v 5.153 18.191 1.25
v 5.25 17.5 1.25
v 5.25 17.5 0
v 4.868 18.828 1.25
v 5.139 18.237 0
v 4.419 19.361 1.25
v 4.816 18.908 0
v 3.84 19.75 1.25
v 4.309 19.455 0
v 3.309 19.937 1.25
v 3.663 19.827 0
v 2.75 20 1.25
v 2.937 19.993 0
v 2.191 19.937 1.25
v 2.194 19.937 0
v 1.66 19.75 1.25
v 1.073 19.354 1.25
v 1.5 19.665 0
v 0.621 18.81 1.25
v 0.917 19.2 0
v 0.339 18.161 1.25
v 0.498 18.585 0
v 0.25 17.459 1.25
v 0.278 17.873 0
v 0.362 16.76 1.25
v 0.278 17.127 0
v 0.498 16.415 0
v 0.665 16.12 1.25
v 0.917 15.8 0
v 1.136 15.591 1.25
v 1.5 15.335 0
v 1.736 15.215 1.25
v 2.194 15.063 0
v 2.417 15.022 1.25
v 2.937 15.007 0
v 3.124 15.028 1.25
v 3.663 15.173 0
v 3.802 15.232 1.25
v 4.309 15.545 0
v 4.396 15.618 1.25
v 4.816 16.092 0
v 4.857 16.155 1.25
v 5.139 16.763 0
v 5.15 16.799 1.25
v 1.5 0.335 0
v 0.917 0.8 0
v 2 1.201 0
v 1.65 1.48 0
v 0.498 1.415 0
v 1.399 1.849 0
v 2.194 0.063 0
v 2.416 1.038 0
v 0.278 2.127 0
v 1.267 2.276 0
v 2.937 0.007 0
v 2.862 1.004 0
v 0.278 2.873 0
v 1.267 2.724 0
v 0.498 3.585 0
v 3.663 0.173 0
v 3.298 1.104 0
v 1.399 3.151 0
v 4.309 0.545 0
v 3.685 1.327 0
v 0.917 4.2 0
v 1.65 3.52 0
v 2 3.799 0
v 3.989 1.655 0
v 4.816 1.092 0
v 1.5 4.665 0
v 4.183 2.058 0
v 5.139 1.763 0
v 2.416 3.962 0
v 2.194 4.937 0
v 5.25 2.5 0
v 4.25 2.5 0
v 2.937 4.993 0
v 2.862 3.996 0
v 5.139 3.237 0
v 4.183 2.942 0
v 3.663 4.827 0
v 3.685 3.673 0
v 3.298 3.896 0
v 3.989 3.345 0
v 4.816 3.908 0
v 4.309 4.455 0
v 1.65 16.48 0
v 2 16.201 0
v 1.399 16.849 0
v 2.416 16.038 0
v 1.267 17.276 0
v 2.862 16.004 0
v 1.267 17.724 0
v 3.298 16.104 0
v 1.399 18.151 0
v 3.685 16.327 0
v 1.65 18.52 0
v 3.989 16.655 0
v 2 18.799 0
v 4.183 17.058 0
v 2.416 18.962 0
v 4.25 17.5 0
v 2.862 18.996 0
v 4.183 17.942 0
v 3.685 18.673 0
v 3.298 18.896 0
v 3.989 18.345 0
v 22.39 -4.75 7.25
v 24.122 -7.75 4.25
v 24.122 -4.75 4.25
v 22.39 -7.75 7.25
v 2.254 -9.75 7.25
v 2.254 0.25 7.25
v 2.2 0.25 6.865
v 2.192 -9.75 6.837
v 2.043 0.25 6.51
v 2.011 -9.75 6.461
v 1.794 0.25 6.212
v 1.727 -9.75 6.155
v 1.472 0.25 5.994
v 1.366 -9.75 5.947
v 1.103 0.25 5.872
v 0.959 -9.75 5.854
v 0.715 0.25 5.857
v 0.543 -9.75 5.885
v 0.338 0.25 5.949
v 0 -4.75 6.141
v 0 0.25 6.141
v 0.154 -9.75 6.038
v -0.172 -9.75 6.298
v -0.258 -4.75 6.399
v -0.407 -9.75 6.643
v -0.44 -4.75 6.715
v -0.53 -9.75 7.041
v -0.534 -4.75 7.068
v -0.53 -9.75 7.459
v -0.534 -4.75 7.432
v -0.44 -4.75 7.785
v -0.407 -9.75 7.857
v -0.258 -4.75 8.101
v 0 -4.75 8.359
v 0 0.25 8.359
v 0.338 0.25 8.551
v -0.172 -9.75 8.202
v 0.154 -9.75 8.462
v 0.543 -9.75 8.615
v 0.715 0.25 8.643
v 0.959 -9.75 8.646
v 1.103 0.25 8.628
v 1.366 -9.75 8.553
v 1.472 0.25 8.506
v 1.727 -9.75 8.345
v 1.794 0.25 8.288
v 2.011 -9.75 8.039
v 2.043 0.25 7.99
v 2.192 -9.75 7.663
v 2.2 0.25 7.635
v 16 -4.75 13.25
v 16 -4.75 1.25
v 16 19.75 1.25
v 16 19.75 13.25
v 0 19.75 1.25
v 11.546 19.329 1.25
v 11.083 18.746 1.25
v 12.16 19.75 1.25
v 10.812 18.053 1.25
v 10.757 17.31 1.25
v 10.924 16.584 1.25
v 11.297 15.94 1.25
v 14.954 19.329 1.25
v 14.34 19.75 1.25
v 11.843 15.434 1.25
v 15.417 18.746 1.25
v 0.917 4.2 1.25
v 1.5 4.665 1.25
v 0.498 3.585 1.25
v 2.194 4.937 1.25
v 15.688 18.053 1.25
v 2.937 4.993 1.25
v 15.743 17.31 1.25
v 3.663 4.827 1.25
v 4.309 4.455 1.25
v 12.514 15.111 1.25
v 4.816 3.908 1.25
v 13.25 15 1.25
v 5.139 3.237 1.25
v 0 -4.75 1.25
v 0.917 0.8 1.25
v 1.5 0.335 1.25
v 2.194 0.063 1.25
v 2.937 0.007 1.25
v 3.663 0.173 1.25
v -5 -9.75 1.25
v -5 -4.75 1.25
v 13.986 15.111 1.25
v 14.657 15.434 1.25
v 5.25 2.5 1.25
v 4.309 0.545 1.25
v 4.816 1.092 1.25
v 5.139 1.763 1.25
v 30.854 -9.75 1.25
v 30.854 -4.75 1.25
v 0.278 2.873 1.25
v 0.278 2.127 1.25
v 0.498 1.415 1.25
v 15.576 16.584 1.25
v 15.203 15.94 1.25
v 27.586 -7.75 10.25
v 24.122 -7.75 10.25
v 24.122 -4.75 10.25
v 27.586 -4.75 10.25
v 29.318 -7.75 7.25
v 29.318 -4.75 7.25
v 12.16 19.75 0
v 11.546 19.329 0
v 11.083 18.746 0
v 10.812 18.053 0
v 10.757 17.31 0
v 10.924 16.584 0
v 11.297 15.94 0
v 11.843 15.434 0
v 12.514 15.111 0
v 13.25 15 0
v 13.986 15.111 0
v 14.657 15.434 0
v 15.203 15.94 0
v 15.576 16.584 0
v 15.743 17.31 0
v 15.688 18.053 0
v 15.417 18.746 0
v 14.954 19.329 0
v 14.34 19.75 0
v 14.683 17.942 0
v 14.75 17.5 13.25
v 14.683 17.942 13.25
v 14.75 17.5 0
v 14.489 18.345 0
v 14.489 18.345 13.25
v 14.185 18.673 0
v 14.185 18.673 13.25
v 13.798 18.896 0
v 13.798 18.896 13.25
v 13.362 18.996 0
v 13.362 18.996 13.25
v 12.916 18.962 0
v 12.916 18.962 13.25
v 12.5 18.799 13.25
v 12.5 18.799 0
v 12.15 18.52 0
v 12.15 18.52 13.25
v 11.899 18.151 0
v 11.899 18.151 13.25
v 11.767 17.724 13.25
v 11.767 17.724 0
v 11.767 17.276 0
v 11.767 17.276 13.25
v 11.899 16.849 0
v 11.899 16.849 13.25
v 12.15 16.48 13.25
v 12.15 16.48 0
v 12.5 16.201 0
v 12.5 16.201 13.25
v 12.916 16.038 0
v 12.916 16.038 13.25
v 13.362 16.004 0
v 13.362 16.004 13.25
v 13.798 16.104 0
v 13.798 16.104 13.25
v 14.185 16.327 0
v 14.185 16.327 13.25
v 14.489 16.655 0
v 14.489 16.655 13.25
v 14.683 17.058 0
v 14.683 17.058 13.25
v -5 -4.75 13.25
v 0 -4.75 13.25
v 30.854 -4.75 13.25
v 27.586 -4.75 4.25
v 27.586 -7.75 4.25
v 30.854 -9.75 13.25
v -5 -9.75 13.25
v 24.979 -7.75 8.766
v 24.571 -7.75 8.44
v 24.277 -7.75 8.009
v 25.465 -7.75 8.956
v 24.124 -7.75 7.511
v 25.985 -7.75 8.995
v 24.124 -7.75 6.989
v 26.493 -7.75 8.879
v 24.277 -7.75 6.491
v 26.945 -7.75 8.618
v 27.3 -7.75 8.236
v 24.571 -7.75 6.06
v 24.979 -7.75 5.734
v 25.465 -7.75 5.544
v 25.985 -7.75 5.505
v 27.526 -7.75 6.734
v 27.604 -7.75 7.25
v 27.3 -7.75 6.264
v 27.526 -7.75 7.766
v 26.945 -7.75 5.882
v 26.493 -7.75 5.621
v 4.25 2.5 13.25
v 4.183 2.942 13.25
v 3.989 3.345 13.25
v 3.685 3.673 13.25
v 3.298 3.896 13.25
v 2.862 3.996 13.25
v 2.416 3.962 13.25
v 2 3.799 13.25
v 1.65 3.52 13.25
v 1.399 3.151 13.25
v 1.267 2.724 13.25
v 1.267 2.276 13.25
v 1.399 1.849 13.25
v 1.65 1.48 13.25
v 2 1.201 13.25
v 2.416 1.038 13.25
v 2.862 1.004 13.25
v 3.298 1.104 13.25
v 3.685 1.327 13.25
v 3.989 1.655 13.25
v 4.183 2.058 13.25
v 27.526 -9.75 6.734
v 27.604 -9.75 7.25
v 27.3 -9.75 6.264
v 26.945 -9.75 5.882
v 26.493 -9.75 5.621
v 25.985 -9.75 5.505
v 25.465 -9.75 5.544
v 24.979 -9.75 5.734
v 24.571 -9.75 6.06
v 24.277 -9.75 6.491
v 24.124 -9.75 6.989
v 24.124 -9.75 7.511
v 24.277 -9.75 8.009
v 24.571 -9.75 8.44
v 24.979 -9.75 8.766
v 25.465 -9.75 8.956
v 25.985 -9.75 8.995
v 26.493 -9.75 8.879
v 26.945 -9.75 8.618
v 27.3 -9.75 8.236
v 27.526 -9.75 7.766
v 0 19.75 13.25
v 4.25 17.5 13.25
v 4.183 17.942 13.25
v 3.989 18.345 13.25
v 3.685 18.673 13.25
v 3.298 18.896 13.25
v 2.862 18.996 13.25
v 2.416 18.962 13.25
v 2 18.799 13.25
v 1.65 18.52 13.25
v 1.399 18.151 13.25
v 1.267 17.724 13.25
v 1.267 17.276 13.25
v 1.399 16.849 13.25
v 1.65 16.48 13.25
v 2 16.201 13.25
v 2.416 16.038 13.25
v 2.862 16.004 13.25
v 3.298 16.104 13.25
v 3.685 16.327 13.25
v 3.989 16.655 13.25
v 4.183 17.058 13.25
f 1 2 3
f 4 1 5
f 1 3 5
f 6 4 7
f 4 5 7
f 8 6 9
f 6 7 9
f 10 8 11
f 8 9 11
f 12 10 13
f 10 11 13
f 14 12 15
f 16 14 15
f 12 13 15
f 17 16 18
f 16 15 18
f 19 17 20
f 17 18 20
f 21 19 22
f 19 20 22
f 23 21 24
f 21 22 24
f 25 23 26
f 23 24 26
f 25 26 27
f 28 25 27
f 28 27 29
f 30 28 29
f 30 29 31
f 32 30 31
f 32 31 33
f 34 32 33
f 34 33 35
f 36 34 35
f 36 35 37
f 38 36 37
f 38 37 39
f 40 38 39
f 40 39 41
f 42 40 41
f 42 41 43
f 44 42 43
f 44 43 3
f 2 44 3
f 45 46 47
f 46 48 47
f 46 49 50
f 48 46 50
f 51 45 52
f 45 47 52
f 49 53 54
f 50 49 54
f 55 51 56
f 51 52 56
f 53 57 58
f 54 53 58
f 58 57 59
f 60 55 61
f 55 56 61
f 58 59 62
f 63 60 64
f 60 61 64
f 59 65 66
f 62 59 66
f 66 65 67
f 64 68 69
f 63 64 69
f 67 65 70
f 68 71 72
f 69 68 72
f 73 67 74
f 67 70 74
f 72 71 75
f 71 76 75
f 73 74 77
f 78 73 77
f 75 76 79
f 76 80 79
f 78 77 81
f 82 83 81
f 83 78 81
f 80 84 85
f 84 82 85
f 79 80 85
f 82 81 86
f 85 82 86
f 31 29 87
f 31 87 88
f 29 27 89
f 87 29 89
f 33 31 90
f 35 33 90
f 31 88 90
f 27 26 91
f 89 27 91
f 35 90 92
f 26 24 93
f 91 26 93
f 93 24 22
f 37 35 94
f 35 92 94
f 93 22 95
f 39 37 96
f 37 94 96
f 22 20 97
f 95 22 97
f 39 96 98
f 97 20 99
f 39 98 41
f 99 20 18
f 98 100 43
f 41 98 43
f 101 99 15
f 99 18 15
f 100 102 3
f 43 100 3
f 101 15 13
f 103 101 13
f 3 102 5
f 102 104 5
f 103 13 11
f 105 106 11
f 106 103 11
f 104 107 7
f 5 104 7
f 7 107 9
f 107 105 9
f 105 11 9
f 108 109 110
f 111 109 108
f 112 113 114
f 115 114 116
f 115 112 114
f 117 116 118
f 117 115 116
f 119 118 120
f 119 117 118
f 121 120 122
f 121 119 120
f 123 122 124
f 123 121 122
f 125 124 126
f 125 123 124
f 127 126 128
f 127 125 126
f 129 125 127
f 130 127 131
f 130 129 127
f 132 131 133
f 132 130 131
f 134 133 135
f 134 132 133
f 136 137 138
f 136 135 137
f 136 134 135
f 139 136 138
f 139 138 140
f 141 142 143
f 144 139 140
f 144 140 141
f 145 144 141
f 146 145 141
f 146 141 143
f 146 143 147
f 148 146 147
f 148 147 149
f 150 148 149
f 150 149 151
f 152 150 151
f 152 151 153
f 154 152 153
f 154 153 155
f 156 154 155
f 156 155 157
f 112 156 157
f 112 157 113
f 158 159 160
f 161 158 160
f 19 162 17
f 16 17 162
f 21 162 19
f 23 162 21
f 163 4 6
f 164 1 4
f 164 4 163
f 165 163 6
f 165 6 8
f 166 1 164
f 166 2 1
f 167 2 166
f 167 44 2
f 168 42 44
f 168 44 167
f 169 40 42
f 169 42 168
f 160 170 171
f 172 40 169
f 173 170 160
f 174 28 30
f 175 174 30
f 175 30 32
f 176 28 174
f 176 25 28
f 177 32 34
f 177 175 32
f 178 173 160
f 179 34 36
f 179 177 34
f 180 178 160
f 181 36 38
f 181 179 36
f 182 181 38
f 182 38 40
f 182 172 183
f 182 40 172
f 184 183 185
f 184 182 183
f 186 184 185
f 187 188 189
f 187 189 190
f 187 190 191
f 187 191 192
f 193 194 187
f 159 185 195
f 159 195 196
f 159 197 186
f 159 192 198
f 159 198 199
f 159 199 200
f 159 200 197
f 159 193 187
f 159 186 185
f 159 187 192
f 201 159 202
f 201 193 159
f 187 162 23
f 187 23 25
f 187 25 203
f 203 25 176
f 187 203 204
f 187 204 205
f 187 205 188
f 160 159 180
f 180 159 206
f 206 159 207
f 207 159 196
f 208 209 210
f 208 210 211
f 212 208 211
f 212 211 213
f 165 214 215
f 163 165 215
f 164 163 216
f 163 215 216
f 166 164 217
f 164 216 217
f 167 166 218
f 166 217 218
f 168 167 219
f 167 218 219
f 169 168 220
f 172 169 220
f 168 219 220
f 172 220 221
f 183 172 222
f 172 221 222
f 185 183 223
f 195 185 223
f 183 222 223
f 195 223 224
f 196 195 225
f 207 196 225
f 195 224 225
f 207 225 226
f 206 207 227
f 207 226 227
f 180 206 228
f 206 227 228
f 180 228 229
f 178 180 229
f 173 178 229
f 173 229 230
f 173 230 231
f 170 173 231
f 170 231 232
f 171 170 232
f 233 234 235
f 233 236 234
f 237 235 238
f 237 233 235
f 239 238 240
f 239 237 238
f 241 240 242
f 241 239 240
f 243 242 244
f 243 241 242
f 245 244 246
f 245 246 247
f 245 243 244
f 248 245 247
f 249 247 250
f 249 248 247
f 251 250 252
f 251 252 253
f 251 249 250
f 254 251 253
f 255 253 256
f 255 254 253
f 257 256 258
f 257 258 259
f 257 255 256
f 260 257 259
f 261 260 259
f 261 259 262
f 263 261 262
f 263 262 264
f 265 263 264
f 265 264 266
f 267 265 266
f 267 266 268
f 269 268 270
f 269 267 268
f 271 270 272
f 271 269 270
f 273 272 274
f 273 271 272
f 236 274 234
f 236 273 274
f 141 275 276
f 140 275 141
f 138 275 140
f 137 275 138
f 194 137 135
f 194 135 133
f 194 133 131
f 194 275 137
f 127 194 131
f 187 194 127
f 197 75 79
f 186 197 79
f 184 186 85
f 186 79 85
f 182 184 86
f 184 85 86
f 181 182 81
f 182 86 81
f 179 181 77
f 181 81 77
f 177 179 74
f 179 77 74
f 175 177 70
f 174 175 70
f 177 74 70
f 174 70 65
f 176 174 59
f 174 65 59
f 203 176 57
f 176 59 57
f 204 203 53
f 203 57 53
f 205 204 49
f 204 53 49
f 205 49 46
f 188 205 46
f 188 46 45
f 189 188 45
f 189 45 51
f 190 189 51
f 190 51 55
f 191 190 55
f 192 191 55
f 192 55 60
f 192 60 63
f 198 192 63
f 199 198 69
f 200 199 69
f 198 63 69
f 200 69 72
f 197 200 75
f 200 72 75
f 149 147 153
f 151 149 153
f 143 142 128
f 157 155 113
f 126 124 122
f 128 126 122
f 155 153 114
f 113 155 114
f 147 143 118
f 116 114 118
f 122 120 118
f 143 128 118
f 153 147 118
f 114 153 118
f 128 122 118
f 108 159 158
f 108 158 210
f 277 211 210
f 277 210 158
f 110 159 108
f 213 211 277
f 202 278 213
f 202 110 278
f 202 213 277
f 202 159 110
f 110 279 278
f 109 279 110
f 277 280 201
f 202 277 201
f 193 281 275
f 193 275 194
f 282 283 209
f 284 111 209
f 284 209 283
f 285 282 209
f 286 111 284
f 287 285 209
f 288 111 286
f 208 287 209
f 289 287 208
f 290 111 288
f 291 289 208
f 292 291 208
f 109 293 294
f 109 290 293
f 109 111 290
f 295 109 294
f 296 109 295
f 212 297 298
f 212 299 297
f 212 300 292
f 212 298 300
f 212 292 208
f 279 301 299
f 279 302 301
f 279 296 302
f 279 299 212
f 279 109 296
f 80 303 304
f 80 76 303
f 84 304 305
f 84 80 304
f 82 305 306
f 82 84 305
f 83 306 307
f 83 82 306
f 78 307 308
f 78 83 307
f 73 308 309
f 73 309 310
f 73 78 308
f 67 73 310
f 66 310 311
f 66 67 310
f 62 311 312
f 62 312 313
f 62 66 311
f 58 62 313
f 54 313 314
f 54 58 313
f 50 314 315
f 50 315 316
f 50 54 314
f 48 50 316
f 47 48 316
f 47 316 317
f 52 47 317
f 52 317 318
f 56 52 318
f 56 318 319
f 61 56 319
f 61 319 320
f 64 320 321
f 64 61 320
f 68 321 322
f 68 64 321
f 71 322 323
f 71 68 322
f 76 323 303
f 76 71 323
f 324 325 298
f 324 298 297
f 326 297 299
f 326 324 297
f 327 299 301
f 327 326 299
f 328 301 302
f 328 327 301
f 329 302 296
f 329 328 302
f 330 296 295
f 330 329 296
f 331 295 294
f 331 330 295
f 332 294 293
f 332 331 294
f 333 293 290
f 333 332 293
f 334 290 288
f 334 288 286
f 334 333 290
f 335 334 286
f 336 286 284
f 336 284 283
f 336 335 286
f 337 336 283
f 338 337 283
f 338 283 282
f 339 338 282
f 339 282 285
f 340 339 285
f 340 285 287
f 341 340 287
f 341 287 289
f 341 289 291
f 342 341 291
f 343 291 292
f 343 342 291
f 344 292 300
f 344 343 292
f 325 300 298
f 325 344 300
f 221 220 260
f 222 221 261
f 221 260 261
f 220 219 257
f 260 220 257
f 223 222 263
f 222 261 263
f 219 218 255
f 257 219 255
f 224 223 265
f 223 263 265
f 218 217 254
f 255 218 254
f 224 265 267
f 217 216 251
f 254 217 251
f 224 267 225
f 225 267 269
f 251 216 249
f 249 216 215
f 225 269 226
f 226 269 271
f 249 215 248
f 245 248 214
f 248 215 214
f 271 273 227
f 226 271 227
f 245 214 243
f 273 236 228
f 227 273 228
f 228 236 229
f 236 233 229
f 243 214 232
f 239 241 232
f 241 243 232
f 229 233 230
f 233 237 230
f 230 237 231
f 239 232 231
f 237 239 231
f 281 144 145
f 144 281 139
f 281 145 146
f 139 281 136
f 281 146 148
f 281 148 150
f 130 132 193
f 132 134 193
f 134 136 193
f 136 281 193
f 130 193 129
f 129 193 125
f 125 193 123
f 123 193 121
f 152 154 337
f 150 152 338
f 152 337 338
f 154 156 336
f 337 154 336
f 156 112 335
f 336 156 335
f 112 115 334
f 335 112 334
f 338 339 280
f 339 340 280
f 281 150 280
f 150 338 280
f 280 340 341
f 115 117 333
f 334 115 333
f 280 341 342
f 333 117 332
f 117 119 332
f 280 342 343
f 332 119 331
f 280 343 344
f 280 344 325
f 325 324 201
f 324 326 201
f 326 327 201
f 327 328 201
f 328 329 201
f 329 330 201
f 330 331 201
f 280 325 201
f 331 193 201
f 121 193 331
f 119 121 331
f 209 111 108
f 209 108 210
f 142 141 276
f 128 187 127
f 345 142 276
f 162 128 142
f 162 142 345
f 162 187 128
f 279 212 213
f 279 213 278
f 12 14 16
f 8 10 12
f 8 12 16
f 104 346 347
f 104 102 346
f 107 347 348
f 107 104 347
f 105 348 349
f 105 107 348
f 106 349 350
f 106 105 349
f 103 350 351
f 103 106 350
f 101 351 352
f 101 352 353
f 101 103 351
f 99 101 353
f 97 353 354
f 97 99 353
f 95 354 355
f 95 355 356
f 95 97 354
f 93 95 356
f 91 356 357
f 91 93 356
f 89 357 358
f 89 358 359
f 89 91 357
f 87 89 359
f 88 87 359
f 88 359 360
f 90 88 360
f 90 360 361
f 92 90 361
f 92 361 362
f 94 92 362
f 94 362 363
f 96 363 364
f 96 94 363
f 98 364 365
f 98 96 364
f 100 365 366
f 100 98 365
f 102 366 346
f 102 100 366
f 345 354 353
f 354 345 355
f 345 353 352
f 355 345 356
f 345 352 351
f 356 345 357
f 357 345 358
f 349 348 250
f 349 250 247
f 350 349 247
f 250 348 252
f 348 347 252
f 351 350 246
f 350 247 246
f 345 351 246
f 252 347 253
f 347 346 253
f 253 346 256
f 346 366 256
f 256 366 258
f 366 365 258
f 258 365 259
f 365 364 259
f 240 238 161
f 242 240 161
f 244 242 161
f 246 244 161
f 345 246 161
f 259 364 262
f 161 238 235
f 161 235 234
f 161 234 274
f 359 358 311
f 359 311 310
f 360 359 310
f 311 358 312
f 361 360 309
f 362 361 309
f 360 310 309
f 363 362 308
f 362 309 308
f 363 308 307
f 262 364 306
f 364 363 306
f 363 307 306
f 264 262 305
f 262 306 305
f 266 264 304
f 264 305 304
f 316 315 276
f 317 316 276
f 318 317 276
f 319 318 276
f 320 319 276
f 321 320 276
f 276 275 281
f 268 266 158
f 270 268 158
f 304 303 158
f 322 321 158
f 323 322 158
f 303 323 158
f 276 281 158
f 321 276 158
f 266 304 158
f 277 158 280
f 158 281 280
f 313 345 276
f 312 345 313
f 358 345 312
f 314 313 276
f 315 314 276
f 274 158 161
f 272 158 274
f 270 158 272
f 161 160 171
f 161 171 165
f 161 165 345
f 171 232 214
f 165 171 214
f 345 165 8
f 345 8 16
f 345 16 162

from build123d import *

# Parameters (mm, degrees)
SKETCH1_R             = 2.5
SKETCH1_R_2           = 1.5
BOSS_EXTRUDE1_DEPTH   = 1.25
BOSS_EXTRUDE1_2_DEPTH = 1.25
BOSS_EXTRUDE1_3_DEPTH = 1.25
BOSS_EXTRUDE2_START   = 1.25
SKETCH1_3_W           = 16
SKETCH1_3_H           = 29.4
SKETCH1_3_R           = 2.5
SKETCH1_3_R_2         = 1.5
BOSS_EXTRUDE2_DEPTH   = 12
SKETCH2_W             = 35.854037965
SKETCH2_H             = 12
BOSS_EXTRUDE3_DEPTH   = 5
SKETCH2_3_W           = 35.854037965
SKETCH2_3_H           = 11
SKETCH2_3_R           = 1.75
SKETCH2_3_R_2         = 1.4
BOSS_EXTRUDE4_DEPTH   = 3
SKETCH2_4_R           = 1.4
CUT_EXTRUDE1_DEPTH    = 10
SKETCH2_5_R           = 1.75
BOSS_EXTRUDE5_DEPTH   = 2


with BuildPart() as part:
    # Sketch1 → Boss-Extrude1 (new body)
    with BuildSketch(Plane.XY):
        with Locations((2.75, 17.5)):
            Circle(SKETCH1_R)
        with Locations((2.75, 17.5)):
            Circle(SKETCH1_R_2, mode=Mode.SUBTRACT)
    extrude(amount=BOSS_EXTRUDE1_DEPTH)



with BuildPart() as body_2:
    # Sketch1 → Boss-Extrude1 2 (new body)
    with BuildSketch(Plane.XY):
        with BuildLine():
            Line((14.339724736, 19.75), (12.160275264, 19.75))
            ThreePointArc((12.160275264, 19.75), (13.25, 15), (14.339724736, 19.75))
        make_face()
        with Locations((13.25, 17.5)):
            Circle(SKETCH1_R_2, mode=Mode.SUBTRACT)
    extrude(amount=BOSS_EXTRUDE1_2_DEPTH)


with BuildPart() as body_3:
    # Sketch1 → Boss-Extrude1 3 (new body)
    with BuildSketch(Plane.XY):
        with Locations((2.75, 2.5)):
            Circle(SKETCH1_R)
        with Locations((2.75, 2.5)):
            Circle(SKETCH1_R_2, mode=Mode.SUBTRACT)
    extrude(amount=BOSS_EXTRUDE1_3_DEPTH)


with BuildPart() as part_1:
    add(part.part)

    add(body_2.part)  # Boss-Extrude2 merges body 2

    add(body_3.part)  # Boss-Extrude2 merges body 3
    # Sketch1<3> → Boss-Extrude2 (add)
    with BuildSketch(Plane.XY.offset(BOSS_EXTRUDE2_START)):
        with Locations((8, 5.05)):
            Rectangle(SKETCH1_3_W, SKETCH1_3_H)
        with Locations((13.25, 17.5)):
            Circle(SKETCH1_3_R, mode=Mode.SUBTRACT)
        with Locations((2.75, 17.5)):
            Circle(SKETCH1_3_R, mode=Mode.SUBTRACT)
        with Locations((2.75, 2.5)):
            Circle(SKETCH1_3_R, mode=Mode.SUBTRACT)
        with Locations((2.75, 2.5)):
            Circle(SKETCH1_3_R)
        with Locations((2.75, 2.5)):
            Circle(SKETCH1_3_R_2, mode=Mode.SUBTRACT)
        with BuildLine():
            Line((3.839724736, 19.75), (1.660275264, 19.75))
            ThreePointArc((1.660275264, 19.75), (1.422278614, 15.381709198), (5.25, 17.5))
            ThreePointArc((5.25, 17.5), (4.868290802, 18.827721386), (3.839724736, 19.75))
        make_face()
        with Locations((2.75, 17.5)):
            Circle(SKETCH1_3_R_2, mode=Mode.SUBTRACT)
        with BuildLine():
            Line((14.339724736, 19.75), (12.160275264, 19.75))
            ThreePointArc((12.160275264, 19.75), (11.922278614, 15.381709198), (15.75, 17.5))
            ThreePointArc((15.75, 17.5), (15.368290802, 18.827721386), (14.339724736, 19.75))
        make_face()
        with Locations((13.25, 17.5)):
            Circle(SKETCH1_3_R_2, mode=Mode.SUBTRACT)
    extrude(amount=BOSS_EXTRUDE2_DEPTH)

    # Sketch2 → Boss-Extrude3 (add)
    with BuildSketch(Plane(origin=(0, -9.75, 0), x_dir=(1, 0, 0), z_dir=(0, 1, 0))):
        with Locations((12.927018983, -7.25)):
            Rectangle(SKETCH2_W, SKETCH2_H)
        Polygon((29.31813958, -7.25), (27.586088773, -4.25), (24.121987157, -4.25), (22.38993635, -7.25), (24.121987157, -10.25), (27.586088773, -10.25), align=None, mode=Mode.SUBTRACT)
    extrude(amount=BOSS_EXTRUDE3_DEPTH)

    # Sketch2<3> → Boss-Extrude4 (add)
    with BuildSketch(Plane(origin=(0, -9.75, 0), x_dir=(1, 0, 0), z_dir=(0, 1, 0))):
        with Locations((12.927018983, -7.25)):
            Rectangle(SKETCH2_3_W, SKETCH2_3_H)
        with Locations((0.854037965, -7.25)):
            Circle(SKETCH2_3_R, mode=Mode.SUBTRACT)
        Polygon((27.586088773, -4.25), (29.31813958, -7.25), (27.586088773, -10.25), (24.121987157, -10.25), (22.38993635, -7.25), (24.121987157, -4.25), align=None, mode=Mode.SUBTRACT)
        with Locations((0.854037965, -7.25)):
            Circle(SKETCH2_3_R_2)
    extrude(amount=BOSS_EXTRUDE4_DEPTH)

    # Sketch2<4> → Cut-Extrude1 (cut)
    with BuildSketch(Plane(origin=(0, -9.75, 0), x_dir=(1, 0, 0), z_dir=(0, 1, 0))):
        with Locations((0.854037965, -7.25)):
            Circle(SKETCH2_4_R)
    extrude(amount=CUT_EXTRUDE1_DEPTH, mode=Mode.SUBTRACT)

    # Sketch2<5> → Boss-Extrude5 (add)
    with BuildSketch(Plane(origin=(0, -9.75, 0), x_dir=(1, 0, 0), z_dir=(0, 1, 0))):
        Polygon((24.121987157, -10.25), (27.586088773, -10.25), (29.31813958, -7.25), (27.586088773, -4.25), (24.121987157, -4.25), (22.38993635, -7.25), align=None)
        with Locations((25.854037965, -7.25)):
            Circle(SKETCH2_5_R, mode=Mode.SUBTRACT)
    extrude(amount=BOSS_EXTRUDE5_DEPTH)


solid = part_1.part
